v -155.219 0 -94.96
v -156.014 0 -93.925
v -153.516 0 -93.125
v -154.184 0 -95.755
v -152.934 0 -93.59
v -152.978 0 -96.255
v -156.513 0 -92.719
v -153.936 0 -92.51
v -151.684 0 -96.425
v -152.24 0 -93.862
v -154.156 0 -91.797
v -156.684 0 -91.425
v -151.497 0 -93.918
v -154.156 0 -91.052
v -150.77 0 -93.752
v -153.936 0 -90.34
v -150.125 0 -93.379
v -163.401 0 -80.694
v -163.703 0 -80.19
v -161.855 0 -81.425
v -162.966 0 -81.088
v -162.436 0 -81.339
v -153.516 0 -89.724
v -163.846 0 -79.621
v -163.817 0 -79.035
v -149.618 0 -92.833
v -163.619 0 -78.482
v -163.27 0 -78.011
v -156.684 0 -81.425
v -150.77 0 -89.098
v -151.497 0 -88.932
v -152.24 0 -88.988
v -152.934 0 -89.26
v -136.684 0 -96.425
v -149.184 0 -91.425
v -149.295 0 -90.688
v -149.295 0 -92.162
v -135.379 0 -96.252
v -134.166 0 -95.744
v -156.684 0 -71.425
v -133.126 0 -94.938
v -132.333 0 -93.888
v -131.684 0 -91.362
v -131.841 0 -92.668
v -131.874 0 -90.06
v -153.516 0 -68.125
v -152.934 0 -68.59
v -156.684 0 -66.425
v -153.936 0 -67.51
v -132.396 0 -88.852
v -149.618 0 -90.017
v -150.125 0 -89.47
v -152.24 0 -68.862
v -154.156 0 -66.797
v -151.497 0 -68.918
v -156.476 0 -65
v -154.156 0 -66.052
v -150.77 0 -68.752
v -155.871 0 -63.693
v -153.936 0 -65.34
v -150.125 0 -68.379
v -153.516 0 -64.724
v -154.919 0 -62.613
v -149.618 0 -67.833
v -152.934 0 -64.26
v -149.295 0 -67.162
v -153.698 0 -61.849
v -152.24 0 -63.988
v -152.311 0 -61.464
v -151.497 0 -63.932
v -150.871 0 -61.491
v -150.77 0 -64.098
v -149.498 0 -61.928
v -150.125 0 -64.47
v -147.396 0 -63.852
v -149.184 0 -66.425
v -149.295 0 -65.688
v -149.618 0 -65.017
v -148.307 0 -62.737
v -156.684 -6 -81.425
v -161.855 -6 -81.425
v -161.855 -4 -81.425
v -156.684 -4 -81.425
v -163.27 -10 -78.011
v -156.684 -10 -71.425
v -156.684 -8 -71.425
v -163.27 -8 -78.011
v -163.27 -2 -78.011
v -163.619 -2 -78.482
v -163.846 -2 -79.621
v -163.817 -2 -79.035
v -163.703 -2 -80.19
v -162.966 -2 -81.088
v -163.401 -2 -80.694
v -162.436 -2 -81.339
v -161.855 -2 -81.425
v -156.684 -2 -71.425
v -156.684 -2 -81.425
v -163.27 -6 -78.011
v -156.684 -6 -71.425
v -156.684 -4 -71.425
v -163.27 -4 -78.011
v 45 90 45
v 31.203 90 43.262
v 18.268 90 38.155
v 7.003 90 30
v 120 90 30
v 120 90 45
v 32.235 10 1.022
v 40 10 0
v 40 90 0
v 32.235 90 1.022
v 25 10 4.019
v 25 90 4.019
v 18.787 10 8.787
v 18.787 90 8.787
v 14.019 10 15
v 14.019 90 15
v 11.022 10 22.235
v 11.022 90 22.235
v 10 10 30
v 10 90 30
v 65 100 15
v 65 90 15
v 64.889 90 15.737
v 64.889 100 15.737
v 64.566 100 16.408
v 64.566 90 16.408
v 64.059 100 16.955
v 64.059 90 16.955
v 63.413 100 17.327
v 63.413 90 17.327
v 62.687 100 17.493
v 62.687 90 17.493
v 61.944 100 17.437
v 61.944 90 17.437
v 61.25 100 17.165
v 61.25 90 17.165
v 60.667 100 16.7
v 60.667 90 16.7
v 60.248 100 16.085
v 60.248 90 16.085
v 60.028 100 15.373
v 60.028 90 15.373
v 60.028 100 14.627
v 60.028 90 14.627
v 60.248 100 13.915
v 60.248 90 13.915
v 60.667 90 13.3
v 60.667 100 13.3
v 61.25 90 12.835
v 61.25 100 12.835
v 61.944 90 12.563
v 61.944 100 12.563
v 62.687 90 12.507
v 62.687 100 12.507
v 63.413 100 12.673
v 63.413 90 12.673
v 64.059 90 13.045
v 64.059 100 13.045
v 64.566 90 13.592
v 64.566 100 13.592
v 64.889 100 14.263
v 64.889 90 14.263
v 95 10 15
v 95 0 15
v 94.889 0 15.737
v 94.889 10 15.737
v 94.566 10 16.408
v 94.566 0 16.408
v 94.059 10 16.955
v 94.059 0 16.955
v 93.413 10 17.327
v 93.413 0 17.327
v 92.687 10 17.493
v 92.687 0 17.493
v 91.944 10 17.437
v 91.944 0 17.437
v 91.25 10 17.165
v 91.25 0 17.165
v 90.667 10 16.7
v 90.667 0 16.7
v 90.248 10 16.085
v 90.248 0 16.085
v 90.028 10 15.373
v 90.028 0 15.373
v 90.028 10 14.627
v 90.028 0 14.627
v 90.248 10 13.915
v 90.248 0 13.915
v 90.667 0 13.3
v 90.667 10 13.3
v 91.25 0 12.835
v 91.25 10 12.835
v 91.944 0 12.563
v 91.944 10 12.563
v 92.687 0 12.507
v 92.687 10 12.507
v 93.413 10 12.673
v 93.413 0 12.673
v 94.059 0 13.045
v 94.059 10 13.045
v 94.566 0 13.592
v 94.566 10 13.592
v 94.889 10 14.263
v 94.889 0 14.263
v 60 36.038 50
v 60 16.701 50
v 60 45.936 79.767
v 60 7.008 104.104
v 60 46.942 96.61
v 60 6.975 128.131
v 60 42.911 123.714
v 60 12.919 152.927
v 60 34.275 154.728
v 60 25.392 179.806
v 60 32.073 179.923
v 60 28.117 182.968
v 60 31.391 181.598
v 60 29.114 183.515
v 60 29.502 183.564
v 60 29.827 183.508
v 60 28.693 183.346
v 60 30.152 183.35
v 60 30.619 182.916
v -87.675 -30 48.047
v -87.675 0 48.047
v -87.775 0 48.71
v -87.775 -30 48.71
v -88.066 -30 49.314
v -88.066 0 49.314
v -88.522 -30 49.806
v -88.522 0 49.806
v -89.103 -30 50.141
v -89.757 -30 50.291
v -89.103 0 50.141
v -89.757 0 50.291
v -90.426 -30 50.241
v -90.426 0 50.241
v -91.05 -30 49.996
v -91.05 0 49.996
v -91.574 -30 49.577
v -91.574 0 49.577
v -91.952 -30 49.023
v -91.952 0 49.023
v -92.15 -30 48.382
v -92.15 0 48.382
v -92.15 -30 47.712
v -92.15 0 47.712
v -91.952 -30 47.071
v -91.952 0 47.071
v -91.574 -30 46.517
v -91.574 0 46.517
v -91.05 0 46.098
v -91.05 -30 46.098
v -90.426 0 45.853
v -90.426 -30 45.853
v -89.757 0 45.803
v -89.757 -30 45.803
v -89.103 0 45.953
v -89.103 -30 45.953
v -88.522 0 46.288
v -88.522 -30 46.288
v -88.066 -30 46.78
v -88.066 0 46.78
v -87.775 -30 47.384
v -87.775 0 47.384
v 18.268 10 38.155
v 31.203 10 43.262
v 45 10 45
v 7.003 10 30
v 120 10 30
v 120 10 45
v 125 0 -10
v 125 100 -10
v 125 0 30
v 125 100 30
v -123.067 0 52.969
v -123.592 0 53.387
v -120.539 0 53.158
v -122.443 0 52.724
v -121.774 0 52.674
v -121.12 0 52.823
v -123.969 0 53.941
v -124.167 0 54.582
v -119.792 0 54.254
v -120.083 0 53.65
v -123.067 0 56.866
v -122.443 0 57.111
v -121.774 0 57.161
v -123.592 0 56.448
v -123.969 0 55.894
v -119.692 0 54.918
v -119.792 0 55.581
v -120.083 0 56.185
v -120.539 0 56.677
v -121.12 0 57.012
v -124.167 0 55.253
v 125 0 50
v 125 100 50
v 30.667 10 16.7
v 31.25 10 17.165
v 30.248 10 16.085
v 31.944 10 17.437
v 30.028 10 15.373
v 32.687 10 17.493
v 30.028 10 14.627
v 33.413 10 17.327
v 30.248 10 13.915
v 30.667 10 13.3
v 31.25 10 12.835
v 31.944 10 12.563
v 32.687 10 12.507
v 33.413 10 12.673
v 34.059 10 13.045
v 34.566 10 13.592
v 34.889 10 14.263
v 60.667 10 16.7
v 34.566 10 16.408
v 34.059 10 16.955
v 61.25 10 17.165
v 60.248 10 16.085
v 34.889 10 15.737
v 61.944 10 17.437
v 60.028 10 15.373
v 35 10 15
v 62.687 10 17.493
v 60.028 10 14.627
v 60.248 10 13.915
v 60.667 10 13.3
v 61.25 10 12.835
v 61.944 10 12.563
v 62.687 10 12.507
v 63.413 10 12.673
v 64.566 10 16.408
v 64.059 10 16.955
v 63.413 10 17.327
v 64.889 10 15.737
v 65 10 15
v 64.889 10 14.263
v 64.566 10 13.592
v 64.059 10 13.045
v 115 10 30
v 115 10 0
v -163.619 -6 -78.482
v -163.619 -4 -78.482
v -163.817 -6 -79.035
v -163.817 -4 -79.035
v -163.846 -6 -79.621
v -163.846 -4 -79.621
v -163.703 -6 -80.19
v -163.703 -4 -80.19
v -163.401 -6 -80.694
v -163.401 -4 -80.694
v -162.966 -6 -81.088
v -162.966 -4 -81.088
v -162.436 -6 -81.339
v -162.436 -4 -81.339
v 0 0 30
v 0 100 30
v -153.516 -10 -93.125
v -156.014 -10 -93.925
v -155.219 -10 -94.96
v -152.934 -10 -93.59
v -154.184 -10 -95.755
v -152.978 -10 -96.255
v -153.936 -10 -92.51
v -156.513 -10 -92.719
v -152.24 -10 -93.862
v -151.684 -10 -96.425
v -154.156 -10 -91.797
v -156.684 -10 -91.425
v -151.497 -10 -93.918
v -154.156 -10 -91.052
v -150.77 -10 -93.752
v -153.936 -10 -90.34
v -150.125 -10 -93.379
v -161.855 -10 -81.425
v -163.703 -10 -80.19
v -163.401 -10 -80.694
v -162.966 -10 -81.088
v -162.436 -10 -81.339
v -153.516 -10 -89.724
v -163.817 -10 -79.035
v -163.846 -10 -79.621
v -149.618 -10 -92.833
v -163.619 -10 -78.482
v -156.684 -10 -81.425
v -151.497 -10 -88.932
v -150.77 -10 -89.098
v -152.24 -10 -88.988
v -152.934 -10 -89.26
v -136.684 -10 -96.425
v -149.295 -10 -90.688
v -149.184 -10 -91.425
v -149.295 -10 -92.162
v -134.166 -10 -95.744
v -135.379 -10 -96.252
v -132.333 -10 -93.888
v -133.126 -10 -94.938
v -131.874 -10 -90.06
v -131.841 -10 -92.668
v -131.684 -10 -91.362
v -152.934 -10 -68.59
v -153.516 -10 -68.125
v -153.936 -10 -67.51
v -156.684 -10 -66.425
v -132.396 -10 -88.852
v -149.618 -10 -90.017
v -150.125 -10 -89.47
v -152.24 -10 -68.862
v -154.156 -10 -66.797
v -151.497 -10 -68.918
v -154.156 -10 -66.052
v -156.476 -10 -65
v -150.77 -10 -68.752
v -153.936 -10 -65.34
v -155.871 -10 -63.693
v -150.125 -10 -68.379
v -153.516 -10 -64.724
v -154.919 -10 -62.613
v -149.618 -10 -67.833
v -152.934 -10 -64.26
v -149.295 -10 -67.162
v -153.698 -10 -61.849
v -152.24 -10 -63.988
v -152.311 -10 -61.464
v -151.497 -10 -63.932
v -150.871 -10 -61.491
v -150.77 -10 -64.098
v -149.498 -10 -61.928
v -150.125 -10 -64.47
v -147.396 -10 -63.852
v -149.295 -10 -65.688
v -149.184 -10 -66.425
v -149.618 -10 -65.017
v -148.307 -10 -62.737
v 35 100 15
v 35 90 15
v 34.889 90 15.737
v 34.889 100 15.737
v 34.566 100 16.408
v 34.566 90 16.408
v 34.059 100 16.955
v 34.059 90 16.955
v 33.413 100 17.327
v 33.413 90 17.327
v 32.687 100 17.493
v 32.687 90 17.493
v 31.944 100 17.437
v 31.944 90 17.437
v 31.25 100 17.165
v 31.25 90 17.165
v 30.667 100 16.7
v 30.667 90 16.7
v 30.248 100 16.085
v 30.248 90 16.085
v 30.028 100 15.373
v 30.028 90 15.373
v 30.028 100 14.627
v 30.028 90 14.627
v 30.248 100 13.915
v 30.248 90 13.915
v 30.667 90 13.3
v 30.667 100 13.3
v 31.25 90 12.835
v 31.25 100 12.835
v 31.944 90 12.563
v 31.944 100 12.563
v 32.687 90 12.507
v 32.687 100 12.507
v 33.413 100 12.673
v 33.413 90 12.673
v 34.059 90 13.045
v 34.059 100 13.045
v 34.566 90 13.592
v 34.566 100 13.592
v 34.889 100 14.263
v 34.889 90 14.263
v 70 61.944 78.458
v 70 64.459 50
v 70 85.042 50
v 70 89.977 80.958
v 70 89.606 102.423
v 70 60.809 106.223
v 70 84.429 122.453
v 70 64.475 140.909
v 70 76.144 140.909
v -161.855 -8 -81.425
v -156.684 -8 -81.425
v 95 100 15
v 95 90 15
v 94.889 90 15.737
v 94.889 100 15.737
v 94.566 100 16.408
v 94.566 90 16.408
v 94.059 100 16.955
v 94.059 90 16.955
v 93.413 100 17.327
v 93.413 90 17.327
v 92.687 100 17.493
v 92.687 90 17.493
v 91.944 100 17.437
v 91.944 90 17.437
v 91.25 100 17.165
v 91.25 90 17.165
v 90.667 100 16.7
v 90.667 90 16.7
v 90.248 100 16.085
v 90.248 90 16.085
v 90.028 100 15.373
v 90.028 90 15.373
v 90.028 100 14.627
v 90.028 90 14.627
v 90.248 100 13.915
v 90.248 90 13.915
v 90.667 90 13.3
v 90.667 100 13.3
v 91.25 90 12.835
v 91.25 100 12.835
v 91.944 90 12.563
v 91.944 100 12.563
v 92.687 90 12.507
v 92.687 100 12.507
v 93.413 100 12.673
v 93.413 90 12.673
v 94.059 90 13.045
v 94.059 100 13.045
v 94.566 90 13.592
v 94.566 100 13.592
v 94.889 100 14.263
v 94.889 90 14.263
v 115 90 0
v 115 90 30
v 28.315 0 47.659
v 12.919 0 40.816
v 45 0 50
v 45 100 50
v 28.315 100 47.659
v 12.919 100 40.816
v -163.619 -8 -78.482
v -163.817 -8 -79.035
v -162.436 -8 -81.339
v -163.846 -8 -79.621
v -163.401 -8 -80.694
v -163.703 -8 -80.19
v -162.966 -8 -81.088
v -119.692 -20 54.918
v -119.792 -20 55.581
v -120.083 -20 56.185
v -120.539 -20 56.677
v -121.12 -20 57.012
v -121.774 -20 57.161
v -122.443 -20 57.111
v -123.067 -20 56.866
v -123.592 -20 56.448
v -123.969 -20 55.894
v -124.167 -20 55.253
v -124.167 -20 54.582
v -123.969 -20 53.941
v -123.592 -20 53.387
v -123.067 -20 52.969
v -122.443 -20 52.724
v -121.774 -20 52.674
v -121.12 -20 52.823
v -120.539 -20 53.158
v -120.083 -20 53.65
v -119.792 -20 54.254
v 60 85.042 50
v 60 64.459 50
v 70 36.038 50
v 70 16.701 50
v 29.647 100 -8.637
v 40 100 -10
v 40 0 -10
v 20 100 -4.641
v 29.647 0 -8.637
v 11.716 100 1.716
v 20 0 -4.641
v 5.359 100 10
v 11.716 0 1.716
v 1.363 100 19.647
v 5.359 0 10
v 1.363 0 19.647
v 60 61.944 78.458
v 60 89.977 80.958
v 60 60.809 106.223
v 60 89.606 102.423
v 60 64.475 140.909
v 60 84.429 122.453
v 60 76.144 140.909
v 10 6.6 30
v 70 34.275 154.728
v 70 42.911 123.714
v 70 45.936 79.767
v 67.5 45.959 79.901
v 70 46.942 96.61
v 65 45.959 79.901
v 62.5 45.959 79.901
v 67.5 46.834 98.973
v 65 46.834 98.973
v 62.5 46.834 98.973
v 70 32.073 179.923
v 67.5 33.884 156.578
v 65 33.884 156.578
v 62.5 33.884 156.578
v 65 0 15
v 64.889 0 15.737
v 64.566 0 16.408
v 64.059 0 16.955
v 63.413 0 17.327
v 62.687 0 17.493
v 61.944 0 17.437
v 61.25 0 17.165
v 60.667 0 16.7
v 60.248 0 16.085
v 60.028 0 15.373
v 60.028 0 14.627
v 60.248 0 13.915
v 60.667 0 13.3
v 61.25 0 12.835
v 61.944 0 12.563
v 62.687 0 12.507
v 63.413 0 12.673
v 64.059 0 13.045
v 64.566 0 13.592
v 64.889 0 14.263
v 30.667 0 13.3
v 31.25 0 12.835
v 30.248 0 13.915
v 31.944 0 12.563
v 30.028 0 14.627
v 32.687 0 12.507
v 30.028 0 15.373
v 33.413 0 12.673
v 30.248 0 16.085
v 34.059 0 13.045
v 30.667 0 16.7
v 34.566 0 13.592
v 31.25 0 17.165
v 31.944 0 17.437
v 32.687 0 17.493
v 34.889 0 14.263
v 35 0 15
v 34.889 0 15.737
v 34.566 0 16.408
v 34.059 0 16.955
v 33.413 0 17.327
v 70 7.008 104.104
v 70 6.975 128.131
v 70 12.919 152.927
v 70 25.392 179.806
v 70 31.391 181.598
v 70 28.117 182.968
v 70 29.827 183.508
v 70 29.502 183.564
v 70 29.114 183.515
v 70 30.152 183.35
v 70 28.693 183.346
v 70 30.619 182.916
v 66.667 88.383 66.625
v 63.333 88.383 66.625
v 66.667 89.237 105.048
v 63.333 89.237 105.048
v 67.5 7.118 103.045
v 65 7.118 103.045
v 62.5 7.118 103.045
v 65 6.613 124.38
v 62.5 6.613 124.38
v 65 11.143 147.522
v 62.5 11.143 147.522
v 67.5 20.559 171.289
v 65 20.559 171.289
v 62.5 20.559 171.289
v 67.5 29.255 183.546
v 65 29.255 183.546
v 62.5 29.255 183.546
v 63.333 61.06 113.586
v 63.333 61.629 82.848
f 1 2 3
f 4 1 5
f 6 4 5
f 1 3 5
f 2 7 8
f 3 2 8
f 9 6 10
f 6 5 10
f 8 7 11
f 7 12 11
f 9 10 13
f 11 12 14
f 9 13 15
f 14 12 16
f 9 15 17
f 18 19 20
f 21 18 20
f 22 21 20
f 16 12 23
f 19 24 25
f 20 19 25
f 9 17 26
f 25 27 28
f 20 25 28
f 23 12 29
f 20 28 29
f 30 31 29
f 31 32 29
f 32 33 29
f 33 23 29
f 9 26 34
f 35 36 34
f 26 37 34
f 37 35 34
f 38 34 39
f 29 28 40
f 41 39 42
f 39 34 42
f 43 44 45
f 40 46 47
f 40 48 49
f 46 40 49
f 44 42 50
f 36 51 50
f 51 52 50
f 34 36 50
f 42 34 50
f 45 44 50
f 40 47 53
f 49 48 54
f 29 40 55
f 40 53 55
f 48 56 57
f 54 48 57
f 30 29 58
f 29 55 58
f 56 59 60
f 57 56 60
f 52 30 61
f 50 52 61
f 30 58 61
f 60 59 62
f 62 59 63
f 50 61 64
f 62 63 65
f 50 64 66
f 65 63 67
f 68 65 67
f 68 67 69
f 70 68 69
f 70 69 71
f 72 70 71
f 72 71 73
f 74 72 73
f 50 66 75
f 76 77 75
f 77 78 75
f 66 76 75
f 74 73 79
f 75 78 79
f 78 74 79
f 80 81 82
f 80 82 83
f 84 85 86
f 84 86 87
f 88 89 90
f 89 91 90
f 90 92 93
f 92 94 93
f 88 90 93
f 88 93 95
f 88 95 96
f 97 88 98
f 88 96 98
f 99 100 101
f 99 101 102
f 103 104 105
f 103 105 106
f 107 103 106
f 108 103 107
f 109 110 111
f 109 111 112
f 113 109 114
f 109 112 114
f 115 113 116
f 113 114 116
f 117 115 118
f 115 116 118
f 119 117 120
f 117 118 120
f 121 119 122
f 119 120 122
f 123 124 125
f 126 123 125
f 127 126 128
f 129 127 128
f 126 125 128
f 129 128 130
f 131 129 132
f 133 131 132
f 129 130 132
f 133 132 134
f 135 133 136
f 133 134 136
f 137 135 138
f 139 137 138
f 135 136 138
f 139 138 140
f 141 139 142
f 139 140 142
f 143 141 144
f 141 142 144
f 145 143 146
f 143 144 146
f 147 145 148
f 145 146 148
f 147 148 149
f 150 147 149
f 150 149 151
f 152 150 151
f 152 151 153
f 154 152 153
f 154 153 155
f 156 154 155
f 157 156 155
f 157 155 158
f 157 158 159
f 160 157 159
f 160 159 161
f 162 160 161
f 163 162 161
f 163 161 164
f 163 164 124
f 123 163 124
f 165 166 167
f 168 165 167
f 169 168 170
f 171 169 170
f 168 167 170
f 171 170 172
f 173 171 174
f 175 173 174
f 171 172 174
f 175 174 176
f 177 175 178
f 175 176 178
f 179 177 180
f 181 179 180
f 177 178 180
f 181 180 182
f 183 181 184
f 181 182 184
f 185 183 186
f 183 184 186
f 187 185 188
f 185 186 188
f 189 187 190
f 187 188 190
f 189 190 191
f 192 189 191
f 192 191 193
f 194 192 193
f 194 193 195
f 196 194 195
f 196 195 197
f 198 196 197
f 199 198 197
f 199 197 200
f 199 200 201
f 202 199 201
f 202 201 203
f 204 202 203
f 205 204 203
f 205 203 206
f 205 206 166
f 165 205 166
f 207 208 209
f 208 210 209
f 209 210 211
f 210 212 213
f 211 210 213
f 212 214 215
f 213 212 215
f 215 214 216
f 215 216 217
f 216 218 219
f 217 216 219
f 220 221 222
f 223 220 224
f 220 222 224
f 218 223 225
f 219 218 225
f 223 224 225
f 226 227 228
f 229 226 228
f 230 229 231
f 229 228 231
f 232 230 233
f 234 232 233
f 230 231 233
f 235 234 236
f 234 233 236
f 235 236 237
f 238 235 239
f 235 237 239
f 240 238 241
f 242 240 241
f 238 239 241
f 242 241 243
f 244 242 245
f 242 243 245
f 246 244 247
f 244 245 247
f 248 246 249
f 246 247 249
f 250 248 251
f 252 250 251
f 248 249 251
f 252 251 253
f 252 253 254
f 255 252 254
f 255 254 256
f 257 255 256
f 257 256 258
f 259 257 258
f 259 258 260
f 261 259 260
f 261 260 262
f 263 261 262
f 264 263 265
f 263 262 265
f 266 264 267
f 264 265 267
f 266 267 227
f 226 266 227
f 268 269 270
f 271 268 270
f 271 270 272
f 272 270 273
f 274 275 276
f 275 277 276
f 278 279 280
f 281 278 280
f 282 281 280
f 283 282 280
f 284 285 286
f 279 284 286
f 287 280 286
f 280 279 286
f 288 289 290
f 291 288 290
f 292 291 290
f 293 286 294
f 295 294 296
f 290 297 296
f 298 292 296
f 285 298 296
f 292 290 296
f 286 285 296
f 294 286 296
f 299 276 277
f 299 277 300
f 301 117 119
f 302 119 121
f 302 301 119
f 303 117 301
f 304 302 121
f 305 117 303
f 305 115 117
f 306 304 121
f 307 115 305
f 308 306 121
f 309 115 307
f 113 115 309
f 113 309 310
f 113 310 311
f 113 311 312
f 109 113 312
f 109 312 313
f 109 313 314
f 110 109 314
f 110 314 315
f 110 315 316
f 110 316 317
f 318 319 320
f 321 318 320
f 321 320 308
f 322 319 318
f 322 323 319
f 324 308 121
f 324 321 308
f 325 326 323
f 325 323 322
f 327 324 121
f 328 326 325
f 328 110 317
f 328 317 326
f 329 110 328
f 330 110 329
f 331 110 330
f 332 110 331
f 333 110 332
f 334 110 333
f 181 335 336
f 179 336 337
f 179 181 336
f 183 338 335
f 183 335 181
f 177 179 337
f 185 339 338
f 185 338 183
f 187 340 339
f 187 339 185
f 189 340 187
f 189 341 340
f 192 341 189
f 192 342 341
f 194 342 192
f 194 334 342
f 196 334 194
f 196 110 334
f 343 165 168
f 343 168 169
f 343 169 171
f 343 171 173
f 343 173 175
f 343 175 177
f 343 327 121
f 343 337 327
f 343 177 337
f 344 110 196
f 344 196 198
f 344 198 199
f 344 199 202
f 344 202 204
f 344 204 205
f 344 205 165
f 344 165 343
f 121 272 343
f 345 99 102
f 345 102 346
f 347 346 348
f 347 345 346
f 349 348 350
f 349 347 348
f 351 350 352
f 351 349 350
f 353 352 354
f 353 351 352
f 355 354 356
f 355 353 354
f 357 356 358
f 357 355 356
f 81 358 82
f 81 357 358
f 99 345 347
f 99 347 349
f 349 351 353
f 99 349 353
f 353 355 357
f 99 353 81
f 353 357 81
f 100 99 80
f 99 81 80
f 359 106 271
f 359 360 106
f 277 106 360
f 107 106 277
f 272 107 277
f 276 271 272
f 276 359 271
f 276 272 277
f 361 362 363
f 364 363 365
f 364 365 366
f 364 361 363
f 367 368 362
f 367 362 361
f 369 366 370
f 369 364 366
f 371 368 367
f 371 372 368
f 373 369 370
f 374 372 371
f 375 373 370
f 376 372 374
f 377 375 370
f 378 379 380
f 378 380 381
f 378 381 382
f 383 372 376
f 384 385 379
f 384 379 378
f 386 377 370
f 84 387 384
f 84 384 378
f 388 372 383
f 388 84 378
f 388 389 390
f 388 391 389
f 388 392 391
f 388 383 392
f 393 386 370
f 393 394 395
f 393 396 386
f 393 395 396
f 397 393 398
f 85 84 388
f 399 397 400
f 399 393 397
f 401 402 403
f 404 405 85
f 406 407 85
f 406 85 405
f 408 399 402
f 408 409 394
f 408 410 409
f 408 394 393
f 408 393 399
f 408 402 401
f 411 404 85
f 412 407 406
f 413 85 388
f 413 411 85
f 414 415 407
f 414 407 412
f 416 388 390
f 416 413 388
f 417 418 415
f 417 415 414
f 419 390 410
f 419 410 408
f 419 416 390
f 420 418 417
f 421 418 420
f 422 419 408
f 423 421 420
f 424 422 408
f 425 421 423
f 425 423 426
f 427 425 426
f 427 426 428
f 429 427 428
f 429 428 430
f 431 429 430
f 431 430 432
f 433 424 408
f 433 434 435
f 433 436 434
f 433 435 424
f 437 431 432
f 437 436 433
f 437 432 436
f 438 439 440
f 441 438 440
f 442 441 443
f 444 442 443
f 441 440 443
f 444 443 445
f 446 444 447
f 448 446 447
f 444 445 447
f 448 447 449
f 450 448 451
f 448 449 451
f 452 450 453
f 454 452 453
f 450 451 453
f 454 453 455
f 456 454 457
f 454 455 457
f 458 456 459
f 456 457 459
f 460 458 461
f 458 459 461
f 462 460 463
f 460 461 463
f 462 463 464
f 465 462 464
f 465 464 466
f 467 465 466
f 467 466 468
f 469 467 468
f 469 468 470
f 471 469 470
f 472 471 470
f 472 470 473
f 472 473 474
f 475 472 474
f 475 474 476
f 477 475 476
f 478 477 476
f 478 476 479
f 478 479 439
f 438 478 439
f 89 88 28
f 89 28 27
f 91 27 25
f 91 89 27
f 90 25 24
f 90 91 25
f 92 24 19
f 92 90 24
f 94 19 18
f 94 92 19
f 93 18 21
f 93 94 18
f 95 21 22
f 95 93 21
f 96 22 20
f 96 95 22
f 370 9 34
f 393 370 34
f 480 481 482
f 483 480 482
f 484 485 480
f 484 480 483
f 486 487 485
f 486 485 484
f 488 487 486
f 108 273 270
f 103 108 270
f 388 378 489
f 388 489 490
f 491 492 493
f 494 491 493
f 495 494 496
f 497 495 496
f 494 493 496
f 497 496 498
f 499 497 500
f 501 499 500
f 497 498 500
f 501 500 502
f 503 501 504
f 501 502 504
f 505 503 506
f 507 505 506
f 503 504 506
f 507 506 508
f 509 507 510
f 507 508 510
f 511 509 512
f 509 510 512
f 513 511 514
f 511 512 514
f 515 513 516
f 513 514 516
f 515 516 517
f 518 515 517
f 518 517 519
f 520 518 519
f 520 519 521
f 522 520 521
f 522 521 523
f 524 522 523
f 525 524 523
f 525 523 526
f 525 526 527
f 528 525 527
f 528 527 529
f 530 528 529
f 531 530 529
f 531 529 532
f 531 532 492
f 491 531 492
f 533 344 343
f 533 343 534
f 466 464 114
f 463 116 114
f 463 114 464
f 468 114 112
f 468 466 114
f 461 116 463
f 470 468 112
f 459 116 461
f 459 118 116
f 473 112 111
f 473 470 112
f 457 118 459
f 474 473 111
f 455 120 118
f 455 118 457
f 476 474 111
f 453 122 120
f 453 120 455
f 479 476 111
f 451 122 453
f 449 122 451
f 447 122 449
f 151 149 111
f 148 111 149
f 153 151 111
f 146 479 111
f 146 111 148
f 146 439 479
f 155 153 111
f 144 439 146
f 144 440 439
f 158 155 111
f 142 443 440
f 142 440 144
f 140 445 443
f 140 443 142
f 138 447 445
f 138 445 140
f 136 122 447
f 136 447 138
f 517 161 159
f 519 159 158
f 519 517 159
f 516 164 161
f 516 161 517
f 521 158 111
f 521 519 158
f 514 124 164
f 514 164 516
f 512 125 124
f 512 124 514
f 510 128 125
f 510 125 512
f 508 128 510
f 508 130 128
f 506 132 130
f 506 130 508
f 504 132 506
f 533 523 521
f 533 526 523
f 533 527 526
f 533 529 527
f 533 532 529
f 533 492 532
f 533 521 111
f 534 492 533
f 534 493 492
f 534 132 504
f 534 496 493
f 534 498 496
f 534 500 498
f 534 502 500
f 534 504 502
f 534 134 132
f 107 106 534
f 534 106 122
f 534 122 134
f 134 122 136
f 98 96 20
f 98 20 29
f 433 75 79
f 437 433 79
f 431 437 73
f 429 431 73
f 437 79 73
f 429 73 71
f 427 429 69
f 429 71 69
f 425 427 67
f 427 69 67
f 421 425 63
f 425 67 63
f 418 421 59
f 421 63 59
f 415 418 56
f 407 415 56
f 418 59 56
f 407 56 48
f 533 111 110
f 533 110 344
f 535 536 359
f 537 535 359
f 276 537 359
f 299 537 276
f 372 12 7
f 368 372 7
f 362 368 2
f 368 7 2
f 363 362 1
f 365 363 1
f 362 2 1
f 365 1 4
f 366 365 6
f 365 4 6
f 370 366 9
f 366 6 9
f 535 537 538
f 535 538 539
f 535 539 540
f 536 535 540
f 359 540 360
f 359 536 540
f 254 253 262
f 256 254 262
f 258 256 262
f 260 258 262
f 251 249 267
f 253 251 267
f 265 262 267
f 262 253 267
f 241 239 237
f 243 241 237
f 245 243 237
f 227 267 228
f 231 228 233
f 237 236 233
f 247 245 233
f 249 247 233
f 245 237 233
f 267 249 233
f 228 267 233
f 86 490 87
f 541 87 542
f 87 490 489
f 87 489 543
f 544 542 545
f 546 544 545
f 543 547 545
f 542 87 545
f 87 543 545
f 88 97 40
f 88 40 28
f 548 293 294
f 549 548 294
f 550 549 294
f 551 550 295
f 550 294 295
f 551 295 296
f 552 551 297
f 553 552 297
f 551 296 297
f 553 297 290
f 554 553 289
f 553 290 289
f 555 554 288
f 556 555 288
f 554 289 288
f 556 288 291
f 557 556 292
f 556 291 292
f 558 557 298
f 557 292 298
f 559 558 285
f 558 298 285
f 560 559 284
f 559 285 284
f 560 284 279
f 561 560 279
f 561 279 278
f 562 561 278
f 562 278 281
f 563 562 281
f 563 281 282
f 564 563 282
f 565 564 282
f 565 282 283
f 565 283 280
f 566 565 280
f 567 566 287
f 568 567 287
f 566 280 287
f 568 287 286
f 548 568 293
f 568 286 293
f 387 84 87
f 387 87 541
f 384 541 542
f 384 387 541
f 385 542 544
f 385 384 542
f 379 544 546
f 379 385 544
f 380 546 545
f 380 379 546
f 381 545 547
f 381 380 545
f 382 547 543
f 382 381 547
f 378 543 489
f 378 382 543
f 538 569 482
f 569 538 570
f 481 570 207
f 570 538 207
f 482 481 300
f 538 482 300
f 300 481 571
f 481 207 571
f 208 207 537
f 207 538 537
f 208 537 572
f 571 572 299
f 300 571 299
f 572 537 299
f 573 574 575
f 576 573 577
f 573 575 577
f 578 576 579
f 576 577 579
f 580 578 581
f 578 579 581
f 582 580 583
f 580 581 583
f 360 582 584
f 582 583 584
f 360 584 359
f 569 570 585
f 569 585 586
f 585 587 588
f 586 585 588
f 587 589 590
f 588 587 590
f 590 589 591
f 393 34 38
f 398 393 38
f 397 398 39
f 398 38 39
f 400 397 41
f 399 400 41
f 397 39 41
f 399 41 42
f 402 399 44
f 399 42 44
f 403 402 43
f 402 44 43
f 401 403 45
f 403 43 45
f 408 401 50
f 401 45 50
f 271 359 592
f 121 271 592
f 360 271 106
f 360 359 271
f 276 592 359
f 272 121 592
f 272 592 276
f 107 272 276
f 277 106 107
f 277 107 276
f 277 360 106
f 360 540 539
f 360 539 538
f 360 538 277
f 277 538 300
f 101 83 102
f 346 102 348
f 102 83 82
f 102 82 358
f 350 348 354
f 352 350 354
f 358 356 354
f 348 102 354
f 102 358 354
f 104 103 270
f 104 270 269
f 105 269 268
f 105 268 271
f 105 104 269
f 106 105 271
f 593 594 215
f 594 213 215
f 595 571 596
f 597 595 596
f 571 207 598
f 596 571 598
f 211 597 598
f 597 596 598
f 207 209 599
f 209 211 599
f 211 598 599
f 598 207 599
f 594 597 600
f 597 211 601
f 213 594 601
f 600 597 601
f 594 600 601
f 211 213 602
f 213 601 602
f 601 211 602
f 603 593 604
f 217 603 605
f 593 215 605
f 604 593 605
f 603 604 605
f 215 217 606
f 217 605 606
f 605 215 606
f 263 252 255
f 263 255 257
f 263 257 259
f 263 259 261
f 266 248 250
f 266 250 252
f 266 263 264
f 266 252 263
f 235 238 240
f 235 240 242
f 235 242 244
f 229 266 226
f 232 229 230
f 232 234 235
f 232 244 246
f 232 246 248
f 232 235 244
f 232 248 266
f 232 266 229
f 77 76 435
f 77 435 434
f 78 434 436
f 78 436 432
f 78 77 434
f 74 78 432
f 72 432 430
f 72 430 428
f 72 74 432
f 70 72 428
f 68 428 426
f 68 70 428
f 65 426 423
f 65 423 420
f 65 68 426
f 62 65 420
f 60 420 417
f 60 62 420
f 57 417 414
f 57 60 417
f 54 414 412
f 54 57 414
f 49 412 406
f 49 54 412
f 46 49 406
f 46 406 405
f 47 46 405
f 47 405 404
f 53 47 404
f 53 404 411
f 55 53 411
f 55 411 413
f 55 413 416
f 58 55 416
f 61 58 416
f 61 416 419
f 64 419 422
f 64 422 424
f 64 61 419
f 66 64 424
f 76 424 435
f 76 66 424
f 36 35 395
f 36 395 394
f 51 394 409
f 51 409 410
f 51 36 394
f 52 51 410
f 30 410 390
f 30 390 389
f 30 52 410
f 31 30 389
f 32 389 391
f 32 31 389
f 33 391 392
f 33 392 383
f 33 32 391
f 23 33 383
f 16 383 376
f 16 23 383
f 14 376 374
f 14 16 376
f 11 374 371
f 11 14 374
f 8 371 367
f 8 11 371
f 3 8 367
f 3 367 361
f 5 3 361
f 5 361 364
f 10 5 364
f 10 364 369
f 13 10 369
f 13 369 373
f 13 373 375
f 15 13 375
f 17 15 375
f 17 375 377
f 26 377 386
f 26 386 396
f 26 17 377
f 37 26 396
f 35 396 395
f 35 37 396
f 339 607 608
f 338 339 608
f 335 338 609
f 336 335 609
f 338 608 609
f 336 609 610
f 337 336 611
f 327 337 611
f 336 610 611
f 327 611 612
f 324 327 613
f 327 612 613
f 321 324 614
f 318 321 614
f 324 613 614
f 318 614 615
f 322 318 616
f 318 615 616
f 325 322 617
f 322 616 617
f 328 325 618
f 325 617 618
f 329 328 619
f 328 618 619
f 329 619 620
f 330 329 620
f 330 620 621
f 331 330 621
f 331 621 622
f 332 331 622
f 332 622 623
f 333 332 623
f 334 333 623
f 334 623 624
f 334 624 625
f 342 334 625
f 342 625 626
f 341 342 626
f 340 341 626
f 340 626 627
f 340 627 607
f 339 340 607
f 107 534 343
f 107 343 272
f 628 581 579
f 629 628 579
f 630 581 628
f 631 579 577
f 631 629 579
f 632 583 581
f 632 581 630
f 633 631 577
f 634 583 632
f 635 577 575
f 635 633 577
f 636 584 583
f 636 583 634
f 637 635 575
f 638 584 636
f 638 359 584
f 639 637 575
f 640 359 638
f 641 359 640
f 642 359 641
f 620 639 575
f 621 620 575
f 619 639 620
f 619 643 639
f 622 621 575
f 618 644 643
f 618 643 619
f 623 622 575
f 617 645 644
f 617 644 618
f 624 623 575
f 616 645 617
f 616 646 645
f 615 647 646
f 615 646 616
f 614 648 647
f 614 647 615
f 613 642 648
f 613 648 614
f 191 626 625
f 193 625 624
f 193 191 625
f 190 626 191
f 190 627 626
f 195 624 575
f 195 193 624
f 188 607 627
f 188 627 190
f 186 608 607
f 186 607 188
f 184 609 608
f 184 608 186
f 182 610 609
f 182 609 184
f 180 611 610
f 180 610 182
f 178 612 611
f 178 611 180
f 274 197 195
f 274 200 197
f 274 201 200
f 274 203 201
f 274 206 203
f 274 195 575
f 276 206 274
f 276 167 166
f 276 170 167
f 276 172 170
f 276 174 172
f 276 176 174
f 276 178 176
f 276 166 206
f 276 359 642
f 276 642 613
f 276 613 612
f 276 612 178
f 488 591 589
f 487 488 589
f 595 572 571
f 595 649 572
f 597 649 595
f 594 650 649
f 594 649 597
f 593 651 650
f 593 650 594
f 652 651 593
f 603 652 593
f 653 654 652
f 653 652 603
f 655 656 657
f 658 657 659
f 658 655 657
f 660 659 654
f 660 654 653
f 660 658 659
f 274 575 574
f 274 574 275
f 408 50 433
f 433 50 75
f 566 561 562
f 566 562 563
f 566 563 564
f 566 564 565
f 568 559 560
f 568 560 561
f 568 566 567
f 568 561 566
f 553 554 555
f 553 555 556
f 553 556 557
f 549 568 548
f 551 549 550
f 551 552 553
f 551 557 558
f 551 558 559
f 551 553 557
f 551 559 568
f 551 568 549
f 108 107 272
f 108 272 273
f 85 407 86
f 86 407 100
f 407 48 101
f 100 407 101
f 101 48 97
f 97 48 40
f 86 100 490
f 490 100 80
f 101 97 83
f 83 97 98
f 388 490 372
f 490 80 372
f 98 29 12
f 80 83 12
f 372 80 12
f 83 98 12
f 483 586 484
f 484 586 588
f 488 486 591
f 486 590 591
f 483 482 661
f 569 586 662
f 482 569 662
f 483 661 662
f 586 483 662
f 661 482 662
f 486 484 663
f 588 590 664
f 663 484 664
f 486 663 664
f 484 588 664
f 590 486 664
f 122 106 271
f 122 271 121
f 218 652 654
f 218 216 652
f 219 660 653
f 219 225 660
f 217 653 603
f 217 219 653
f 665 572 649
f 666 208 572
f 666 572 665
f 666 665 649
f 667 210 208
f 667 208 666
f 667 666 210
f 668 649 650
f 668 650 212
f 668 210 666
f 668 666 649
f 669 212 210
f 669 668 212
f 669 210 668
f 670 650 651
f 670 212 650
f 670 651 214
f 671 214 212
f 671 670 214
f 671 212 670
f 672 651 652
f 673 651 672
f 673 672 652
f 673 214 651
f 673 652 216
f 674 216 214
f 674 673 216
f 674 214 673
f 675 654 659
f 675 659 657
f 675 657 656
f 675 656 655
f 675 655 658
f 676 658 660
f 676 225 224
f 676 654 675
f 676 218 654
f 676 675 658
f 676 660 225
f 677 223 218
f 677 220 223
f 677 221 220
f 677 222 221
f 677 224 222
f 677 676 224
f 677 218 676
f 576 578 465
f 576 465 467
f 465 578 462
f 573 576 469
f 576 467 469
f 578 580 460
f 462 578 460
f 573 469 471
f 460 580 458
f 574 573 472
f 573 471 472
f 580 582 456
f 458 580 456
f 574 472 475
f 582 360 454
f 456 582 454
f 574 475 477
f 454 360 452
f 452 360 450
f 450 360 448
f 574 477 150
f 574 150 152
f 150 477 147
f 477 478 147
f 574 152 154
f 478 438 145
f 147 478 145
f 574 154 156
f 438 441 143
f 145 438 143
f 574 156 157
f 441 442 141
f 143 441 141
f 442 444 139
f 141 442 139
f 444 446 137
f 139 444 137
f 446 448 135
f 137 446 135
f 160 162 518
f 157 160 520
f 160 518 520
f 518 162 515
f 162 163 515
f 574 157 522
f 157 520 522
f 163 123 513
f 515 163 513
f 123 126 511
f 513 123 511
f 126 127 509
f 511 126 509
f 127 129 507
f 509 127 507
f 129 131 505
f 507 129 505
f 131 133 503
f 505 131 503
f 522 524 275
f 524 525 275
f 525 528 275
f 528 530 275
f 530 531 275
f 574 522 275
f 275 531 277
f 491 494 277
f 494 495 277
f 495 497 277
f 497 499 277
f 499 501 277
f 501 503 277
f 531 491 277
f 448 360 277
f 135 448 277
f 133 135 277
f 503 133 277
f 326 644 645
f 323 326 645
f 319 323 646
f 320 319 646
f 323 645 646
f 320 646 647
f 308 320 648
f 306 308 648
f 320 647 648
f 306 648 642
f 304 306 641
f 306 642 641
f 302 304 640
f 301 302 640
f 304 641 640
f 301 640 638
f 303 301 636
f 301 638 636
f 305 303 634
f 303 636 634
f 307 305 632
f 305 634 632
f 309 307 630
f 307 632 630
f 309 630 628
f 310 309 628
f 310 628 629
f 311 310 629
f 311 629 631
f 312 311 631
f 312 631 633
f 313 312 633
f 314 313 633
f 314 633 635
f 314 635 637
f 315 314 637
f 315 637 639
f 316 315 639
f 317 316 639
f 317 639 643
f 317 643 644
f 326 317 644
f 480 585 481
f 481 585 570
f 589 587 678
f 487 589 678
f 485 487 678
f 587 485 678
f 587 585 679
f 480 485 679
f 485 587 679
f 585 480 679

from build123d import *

# Parameters (mm, degrees)
F0_W           = 125
F0_H           = 100
F0_W_2         = 105
F0_H_2         = 80
F1_DEPTH       = 30
F2_R           = 2.5
F3_DEPTH       = 100.001
F4_W           = 125
F4_H           = 100
F4_W_2         = 105
F4_H_2         = 80
F5_DEPTH       = 10
F7_DEPTH       = 6666
F9_DEPTH       = 83.4
F10_W          = 80
F10_H          = 20
F11_DEPTH      = 100
F15_DEPTH      = 10
F17_DEPTH      = 40
F17_DEPTH_BACK = 40
F18_R          = 2.5
F19_DEPTH      = 10
F21_DEPTH      = 10
F22_W          = 11.9066902784
F22_H          = 2
F22_W_2        = 5.1715728753
F22_W_3        = 11.2758645205
F23_DEPTH      = 25
F24_R          = 2.25
F25_DEPTH      = 20
F26_R          = 2.25
F27_DEPTH      = 30


with BuildPart() as f1:
    # F0 (on Top) → F1 (new body)
    with BuildSketch(Plane.XY):
        with Locations((62.5, 50)):
            Rectangle(F0_W, F0_H)
        with Locations((62.5, 50)):
            Rectangle(F0_W_2, F0_H_2, mode=Mode.SUBTRACT)
    extrude(amount=F1_DEPTH)

    # F2 (on face) → F3 (cut, through all)
    with BuildSketch(Plane.XZ):
        with Locations((32.5, 15)):
            Circle(F2_R)
        with Locations((62.5, 15)):
            Circle(F2_R)
        with Locations((92.5, 15)):
            Circle(F2_R)
    extrude(amount=-F3_DEPTH, mode=Mode.SUBTRACT)

    # F4 (on face) → F5 (join)
    with BuildSketch(Plane(origin=(0, 0, 0), x_dir=(1, 0, 0), z_dir=(0, 0, -1))):
        with Locations((62.5, -50)):
            Rectangle(F4_W, F4_H)
        with Locations((62.5, -50)):
            Rectangle(F4_W_2, F4_H_2, mode=Mode.SUBTRACT)
        with Locations((62.5, -50)):
            Rectangle(F4_W_2, F4_H_2)
    extrude(amount=F5_DEPTH)

    # F6 (on face) → F7 (cut)
    with BuildSketch(Plane.XZ):
        Polygon((0, -10), (0, 30), (-36.8616729975, 33.3101339638), (-29.7704413533, -57.1963898838), (40, -10), align=None)
        with BuildLine():
            ThreePointArc((40, -10), (11.7157287525, 1.7157287525), (0, 30))
            Line((0, 30), (0, -10))
            Line((0, -10), (40, -10))
        make_face()
    extrude(amount=-F7_DEPTH, mode=Mode.SUBTRACT)

    # F8 (on face) → F9 (join)
    with BuildSketch(Plane.XZ.offset(-90)):
        with BuildLine():
            Line((10, 30), (10, 3.5424868894))
            ThreePointArc((10, 3.5424868894), (11.7157287525, 1.7157287525), (13.5424868894, 0))
            Line((13.5424868894, 0), (40, 0))
            ThreePointArc((40, 0), (18.7867965644, 8.7867965644), (10, 30))
        make_face()
    extrude(amount=F9_DEPTH)


with BuildPart() as f11:
    # F10 (on face) → F11 (new body)
    with BuildSketch(Plane.XZ):
        with BuildLine():
            Line((0, 30), (45, 30))
            Line((45, 30), (45, 50))
            ThreePointArc((45, 50), (20.3778554955, 44.7748251351), (0, 30))
        make_face()
        with Locations((85, 40)):
            Rectangle(F10_W, F10_H)
    extrude(amount=-F11_DEPTH)

    # F14 (on offset) → F15 (join)
    with BuildSketch(Plane.YZ.offset(60)):
        with BuildLine():
            Line((64.4753500819, 49.8327091336), (85.0027536981, 49.8327091336))
            add(Edge.make_bspline(
                [(85.0027536981, 49.8327091336), (86.1665383789, 54.7384858339), (89.0602060082, 67.0907089545), (92.6809583428, 106.7258604967), (81.6452944269, 129.5412851185), (76.1444941163, 140.9089565277)],
                knots=[0, 0, 0, 0, 0.2505763425, 0.6259139796, 1, 1, 1, 1], degree=3))
            Line((76.1444941163, 140.9089565277), (64.4753500819, 140.9089565277))
            add(Edge.make_bspline(
                [(64.4753500819, 140.9089565277), (63.0385344229, 131.9328773477), (60.0835105921, 113.4722434338), (61.3578321961, 82.6051306794), (63.4232718078, 60.892518239), (64.4753500819, 49.8327091336)],
                knots=[0, 0, 0, 0, 0.3170912381, 0.6521450118, 1, 1, 1, 1], degree=3))
        make_face()
        with BuildLine():
            Line((16.7012212295, 50), (36.0381749595, 50))
            add(Edge.make_bspline(
                [(36.0381749595, 50), (39.9439264096, 60.5788452322), (48.8842587835, 79.1577540087), (45.9418389645, 119.6915304439), (32.2516183868, 155.6878532796), (32.1214988224, 172.4366188097), (32.0729725063, 179.9233108759)],
                knots=[0, 0, 0, 0, 0.2446036002, 0.518483464, 0.7891223984, 1, 1, 1, 1], degree=3))
            add(Edge.make_bspline(
                [(16.7012212295, 50), (12.8164200839, 69.7679192689), (5.1557437253, 103.0165449914), (6.3359006778, 143.1855642768), (28.4164917181, 189.4002776519), (31.3234141752, 181.8729274365), (32.0729725063, 179.9233108759)],
                knots=[0, 0, 0, 0, 0.3260645241, 0.6228520483, 0.9048596934, 1, 1, 1, 1], degree=3))
        make_face()
    extrude(amount=F15_DEPTH)


with BuildPart() as f17_tool:
    # F16 (on offset) → F17 (new body, two sides)
    with BuildSketch(Plane.XZ.offset(-50)) as f17_sk:
        with BuildLine():
            Line((120, 45), (45, 45))
            ThreePointArc((45, 45), (24.5746472766, 41.1142074845), (7.003, 29.9997291191))
            Line((7.003, 29.9997291191), (120, 29.9997291191))
            Line((120, 29.9997291191), (120, 45))
        make_face()
    extrude(amount=-F17_DEPTH)
    extrude(f17_sk.sketch, amount=F17_DEPTH_BACK)


with BuildPart() as f1_1:
    add(f1.part)

    # F17: cut by f17_tool
    add(f17_tool.part, mode=Mode.SUBTRACT)


with BuildPart() as f11_1:
    add(f11.part)

    # F17: cut by f17_tool
    add(f17_tool.part, mode=Mode.SUBTRACT)


with BuildPart() as f19:
    # F18 (on Front) → F19 (new body)
    with BuildSketch(Plane.XZ):
        with BuildLine():
            ThreePointArc((-147.3962509632, -63.8523980975), (-153.0183835013, -61.6063022336), (-156.6837155918, -66.4248768747))
            Line((-156.6837155918, -66.4248768747), (-156.6837155918, -91.4248768747))
            ThreePointArc((-156.6837155918, -91.4248768747), (-155.2192494977, -94.9604107806), (-151.6837155918, -96.4248768747))
            Line((-151.6837155918, -96.4248768747), (-136.6837155918, -96.4248768747))
            ThreePointArc((-136.6837155918, -96.4248768747), (-132.332716058, -93.8883709496), (-132.3962509632, -88.8523980975))
            Line((-132.3962509632, -88.8523980975), (-147.3962509632, -63.8523980975))
        make_face()
        with Locations((-151.6837155918, -91.4248768747)):
            Circle(F18_R, mode=Mode.SUBTRACT)
        with Locations((-151.6837155918, -66.4248768747)):
            Circle(F18_R, mode=Mode.SUBTRACT)
    extrude(amount=F19_DEPTH)

    # F20 (on face) → F21 (join)
    with BuildSketch(Plane.XZ.offset(10)):
        with BuildLine():
            Line((-156.6837155918, -81.4248768747), (-156.6837155918, -71.4248768747))
            Line((-156.6837155918, -71.4248768747), (-163.2695020294, -78.0106633123))
            ThreePointArc((-163.2695020294, -78.0106633123), (-163.7030475321, -80.1902437394), (-161.855288467, -81.4248768747))
            Line((-161.855288467, -81.4248768747), (-156.6837155918, -81.4248768747))
        make_face()
    extrude(amount=-F21_DEPTH)

    # F22 (on face) → F23 (cut)
    with BuildSketch(Plane(origin=(0, 0, -81.4248768747), x_dir=(1, 0, 0), z_dir=(0, 0, -1))):
        with Locations((-167.8086336062, 7)):
            Rectangle(F22_W, F22_H)
        with Locations((-159.2695020294, 3)):
            Rectangle(F22_W_2, F22_H)
        with Locations((-159.2695020294, 7)):
            Rectangle(F22_W_2, F22_H)
        with Locations((-167.4932207273, 3)):
            Rectangle(F22_W_3, F22_H)
    extrude(amount=-F23_DEPTH, mode=Mode.SUBTRACT)


with BuildPart() as f25:
    # F24 (on Front) → F25 (new body)
    with BuildSketch(Plane.XZ):
        with Locations((-121.942281723, 54.9175590277)):
            Circle(F24_R)
    extrude(amount=F25_DEPTH)


with BuildPart() as f27:
    # F26 (on Front) → F27 (new body)
    with BuildSketch(Plane.XZ):
        with Locations((-89.9250730872, 48.0470210314)):
            Circle(F26_R)
    extrude(amount=F27_DEPTH)


solid = Compound([f1_1.part, f11_1.part, f19.part, f25.part, f27.part])
